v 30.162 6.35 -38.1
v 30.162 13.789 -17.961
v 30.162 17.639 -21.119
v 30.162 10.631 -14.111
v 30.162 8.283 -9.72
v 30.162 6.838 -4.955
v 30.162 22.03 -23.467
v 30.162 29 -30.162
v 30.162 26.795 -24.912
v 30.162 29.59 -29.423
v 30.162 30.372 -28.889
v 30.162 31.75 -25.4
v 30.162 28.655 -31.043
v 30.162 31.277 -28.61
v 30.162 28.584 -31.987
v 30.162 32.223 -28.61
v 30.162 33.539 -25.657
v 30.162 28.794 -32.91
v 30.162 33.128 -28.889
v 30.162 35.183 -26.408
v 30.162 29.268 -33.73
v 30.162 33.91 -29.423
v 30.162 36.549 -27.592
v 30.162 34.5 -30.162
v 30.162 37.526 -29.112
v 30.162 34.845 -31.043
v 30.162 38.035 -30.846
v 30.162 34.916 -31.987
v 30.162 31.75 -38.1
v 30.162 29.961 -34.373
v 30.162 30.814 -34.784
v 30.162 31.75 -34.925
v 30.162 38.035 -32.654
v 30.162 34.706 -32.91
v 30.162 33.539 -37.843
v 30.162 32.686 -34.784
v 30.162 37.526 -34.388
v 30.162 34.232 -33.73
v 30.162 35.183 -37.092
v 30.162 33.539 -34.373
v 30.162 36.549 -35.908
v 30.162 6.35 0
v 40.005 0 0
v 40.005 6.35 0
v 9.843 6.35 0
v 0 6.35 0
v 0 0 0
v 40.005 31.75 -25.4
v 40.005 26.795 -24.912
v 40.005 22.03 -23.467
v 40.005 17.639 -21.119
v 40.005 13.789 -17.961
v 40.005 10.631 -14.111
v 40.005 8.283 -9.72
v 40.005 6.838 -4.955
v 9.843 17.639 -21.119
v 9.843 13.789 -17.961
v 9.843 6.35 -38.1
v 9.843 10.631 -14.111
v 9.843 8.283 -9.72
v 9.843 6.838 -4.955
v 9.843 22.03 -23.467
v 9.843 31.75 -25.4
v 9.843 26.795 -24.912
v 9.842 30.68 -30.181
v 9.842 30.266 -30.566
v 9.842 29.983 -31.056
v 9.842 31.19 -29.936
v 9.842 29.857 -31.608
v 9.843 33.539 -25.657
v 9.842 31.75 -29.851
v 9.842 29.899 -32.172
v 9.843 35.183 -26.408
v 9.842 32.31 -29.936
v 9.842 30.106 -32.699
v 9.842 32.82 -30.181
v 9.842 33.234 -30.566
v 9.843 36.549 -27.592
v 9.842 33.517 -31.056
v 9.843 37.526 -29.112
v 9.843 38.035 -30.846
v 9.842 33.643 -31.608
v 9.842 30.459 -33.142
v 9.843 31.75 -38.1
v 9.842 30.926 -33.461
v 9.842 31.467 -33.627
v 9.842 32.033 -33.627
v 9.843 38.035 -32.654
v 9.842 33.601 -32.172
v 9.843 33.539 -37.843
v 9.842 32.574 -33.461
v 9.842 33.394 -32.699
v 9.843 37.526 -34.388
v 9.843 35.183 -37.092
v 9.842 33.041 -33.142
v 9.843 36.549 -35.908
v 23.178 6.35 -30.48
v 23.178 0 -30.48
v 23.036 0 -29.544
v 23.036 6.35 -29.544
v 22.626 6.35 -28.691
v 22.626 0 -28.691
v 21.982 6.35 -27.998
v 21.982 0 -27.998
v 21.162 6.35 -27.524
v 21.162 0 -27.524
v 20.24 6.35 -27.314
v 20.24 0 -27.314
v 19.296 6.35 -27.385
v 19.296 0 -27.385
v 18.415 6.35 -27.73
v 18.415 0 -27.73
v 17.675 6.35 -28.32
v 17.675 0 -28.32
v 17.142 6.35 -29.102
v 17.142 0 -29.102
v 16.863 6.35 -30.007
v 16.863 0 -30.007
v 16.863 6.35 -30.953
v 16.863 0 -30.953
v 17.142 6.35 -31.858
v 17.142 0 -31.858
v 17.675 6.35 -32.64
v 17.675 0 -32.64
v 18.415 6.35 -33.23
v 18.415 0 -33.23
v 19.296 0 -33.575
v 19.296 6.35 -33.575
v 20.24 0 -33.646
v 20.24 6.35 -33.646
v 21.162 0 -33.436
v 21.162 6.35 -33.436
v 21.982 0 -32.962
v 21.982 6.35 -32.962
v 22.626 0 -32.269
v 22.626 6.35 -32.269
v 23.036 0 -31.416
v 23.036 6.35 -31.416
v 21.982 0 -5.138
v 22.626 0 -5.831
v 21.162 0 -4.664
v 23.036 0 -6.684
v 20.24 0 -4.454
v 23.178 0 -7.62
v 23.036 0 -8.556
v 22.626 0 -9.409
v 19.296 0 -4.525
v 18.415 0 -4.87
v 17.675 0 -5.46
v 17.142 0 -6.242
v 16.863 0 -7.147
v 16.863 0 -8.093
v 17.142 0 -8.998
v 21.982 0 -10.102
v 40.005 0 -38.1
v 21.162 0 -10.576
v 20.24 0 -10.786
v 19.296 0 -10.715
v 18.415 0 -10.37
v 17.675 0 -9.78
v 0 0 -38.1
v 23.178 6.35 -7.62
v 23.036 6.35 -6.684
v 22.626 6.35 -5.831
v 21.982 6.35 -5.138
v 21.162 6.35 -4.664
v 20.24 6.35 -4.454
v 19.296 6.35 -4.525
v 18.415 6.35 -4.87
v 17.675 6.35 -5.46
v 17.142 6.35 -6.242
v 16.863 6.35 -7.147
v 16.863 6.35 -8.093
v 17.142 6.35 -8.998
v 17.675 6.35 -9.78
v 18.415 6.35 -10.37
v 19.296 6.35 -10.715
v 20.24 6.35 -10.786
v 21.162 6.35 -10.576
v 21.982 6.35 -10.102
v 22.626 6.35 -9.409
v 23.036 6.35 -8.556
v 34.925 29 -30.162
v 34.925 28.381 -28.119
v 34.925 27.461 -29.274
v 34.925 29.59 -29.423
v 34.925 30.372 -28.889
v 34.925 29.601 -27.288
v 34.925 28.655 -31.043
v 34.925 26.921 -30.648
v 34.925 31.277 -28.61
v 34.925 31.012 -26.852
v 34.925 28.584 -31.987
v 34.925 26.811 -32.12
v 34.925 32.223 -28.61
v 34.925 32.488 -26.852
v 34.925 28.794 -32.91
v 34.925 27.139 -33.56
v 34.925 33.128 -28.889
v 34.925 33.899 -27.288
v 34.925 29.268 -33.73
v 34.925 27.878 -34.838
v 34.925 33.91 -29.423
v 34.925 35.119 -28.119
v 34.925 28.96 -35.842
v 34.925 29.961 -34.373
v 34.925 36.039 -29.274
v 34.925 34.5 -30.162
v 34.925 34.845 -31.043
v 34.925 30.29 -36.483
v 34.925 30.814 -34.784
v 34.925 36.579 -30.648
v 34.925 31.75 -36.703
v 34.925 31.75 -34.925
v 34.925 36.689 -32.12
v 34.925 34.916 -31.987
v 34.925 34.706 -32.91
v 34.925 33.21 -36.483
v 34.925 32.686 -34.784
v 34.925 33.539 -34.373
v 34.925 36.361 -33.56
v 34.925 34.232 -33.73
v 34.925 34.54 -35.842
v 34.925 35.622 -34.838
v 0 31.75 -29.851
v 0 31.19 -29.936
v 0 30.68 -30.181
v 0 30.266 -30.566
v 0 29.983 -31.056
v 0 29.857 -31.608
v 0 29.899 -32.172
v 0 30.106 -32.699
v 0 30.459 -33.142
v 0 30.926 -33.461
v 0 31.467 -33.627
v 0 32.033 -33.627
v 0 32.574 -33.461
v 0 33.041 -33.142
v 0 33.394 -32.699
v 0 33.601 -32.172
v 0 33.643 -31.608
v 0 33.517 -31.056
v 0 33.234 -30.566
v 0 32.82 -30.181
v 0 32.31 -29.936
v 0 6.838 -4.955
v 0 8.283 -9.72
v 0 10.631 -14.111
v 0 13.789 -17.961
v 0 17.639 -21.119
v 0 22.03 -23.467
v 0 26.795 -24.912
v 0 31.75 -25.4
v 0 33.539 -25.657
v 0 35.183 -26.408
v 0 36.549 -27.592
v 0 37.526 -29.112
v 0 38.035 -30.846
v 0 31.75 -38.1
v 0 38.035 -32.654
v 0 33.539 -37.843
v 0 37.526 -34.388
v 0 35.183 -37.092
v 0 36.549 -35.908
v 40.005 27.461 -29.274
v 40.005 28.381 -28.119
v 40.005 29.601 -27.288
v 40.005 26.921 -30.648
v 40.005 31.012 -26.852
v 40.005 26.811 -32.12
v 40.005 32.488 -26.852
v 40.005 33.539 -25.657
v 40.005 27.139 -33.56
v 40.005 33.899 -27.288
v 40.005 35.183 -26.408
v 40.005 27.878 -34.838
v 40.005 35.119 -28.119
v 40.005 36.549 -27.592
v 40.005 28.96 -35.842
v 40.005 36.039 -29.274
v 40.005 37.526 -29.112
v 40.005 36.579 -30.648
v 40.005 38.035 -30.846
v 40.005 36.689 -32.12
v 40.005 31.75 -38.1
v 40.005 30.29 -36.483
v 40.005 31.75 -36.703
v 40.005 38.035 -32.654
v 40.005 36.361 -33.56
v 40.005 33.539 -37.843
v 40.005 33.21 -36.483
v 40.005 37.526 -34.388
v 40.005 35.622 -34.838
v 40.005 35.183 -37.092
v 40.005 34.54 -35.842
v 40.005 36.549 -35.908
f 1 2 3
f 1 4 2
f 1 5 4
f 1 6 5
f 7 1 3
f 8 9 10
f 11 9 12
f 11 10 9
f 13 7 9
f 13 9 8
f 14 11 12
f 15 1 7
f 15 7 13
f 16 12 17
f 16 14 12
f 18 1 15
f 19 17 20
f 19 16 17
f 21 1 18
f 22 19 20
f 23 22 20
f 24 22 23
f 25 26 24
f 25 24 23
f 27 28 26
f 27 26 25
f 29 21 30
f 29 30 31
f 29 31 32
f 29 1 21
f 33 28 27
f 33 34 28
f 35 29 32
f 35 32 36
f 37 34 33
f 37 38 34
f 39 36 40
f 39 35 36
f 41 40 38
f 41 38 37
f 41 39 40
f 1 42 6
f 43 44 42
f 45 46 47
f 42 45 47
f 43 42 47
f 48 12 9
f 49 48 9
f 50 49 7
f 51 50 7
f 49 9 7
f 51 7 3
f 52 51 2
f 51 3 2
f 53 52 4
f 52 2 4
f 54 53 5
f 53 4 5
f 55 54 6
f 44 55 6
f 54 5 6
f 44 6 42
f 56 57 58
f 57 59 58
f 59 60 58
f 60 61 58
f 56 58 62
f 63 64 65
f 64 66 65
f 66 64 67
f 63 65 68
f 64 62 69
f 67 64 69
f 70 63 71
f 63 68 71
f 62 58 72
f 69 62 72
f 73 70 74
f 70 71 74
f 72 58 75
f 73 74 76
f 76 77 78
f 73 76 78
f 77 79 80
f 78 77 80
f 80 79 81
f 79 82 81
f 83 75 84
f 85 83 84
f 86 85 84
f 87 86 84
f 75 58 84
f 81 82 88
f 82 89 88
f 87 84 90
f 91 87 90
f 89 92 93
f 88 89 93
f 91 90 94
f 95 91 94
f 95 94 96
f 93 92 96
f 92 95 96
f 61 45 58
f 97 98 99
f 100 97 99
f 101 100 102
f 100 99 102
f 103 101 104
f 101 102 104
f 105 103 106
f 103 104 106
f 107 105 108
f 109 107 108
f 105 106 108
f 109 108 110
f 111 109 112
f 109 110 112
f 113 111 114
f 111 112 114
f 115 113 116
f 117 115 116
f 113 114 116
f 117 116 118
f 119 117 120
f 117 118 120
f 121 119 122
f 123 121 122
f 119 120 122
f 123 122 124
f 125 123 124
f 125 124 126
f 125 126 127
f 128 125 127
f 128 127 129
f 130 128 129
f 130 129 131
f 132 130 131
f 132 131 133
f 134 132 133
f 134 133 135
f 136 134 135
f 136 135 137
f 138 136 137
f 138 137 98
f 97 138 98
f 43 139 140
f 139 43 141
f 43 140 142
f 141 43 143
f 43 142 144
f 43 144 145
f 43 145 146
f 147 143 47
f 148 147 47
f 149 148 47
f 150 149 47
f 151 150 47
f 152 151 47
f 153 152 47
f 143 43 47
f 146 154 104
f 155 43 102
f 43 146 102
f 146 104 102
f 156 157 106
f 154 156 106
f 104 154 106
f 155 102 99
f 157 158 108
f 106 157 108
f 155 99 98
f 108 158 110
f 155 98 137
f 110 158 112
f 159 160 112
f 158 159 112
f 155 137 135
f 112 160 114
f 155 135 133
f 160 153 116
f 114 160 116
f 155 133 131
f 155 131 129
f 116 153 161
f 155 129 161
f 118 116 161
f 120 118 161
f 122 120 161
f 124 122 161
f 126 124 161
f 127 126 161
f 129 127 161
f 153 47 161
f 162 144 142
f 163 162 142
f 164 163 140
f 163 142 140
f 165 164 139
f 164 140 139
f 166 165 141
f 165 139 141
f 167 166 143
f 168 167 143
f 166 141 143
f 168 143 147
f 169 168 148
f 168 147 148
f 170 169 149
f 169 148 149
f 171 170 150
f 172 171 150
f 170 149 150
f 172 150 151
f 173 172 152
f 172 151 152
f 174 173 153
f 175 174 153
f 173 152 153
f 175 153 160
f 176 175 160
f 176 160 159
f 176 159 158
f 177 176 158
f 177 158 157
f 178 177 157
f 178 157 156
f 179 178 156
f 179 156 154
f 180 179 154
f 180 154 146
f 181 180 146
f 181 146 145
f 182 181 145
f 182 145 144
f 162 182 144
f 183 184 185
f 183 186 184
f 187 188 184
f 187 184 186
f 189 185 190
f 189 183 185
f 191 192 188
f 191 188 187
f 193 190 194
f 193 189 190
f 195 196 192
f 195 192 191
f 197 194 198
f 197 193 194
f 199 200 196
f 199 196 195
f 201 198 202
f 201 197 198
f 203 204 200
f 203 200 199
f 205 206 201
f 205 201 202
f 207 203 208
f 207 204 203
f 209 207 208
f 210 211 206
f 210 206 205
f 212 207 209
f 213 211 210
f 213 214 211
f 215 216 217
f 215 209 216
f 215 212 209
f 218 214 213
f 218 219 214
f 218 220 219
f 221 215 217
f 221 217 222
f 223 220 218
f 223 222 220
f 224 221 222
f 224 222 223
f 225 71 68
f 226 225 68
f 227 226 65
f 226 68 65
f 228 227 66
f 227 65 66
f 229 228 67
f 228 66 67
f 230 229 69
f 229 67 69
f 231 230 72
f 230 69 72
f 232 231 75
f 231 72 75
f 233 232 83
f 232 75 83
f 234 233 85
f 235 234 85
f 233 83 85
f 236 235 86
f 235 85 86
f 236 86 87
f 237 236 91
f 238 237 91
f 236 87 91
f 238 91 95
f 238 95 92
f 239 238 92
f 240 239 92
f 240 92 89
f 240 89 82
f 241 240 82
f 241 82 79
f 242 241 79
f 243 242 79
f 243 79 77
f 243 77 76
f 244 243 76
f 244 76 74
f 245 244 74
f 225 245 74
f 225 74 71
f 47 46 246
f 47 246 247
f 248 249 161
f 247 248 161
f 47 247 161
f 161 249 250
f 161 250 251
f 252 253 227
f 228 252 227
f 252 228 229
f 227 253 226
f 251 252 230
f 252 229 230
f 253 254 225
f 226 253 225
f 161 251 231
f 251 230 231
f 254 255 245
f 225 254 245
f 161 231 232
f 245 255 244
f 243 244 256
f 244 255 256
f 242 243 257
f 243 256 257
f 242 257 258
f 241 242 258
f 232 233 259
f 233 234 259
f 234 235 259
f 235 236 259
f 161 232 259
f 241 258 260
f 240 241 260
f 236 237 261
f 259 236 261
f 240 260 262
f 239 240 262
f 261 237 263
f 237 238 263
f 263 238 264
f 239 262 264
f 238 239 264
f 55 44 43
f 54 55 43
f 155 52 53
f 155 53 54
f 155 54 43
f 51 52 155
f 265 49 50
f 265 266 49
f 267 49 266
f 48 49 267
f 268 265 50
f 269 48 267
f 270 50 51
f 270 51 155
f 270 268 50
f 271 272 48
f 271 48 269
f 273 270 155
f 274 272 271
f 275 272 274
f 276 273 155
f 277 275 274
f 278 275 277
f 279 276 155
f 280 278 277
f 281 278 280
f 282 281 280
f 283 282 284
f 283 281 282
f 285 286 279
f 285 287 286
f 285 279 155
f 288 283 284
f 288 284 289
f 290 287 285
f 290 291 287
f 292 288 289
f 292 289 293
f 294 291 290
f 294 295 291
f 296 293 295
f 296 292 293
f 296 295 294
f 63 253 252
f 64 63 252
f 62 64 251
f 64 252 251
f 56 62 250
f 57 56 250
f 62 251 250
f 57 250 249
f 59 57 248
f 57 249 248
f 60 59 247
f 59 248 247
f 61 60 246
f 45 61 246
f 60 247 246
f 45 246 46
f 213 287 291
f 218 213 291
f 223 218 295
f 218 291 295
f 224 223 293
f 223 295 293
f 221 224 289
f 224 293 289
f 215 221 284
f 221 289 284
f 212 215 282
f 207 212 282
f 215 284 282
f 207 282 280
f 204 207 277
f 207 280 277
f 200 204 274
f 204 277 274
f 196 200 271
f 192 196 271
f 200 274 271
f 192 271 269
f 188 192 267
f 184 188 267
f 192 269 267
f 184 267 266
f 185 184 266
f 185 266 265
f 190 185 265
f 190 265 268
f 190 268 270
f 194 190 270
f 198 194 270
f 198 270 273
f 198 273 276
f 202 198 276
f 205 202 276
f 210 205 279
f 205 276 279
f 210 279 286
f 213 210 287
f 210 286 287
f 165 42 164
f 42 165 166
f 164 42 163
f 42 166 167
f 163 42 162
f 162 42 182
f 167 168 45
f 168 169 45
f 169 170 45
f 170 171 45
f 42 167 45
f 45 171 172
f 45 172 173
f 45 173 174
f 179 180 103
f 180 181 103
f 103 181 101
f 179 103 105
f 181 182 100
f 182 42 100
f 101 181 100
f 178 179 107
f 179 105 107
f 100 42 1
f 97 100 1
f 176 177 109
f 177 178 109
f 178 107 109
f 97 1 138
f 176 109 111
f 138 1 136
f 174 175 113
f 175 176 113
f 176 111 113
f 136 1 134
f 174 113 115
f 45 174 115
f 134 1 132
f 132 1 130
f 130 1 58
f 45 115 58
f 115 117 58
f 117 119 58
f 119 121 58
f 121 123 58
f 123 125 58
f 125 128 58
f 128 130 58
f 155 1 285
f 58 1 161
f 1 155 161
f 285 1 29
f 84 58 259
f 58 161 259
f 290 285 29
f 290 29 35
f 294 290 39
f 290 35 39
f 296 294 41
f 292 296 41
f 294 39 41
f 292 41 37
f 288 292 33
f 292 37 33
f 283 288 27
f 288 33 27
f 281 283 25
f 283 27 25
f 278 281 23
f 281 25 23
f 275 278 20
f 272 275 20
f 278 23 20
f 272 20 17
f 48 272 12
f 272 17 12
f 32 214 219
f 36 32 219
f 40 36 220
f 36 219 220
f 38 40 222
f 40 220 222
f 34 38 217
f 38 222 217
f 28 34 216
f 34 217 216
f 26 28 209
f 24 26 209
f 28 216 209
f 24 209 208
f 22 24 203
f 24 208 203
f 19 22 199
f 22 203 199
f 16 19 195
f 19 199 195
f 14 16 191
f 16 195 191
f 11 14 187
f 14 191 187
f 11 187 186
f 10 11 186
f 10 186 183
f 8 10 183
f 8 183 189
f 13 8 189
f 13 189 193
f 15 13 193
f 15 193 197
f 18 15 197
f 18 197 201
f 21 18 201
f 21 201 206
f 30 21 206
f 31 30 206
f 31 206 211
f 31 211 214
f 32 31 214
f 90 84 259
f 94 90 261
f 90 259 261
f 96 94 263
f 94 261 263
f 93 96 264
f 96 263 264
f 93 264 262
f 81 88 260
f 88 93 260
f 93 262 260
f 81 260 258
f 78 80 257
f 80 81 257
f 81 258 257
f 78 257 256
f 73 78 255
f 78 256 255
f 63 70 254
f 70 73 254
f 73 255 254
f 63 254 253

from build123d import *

# Parameters (mm, degrees)
EXTRUDE3_DEPTH                 = 40.005
SKETCH6_W                      = 20.32
SKETCH6_H                      = 42.20483691
EXTRUDE_SLOT_DEPTH             = 39.1
SKETCH8_R                      = 3.175
EXTRUDE_SHOULDER_THROUGH_DEPTH = 9.8425
SKETCH9_R                      = 4.953
EXTRUDE_CNTR_BORE_DEPTH        = 5.08
F_10_24_TAPPED_HOLE1_D         = 3.7973
F_10_24_TAPPED_HOLE1_DEPTH     = 12.827
F_10_24_TAPPED_HOLE1_TIP       = 1.140824014
SKETCH13_R                     = 3.175
EXTRUDE7_DEPTH                 = 39.1


with BuildPart() as part:
    # Sketch5 → Extrude3 (new body)
    with BuildSketch(Plane(origin=(0, 0, 0), x_dir=(0, 0, -1), z_dir=(1, 0, 0))):
        with BuildLine():
            Line((0, 0), (38.1, 0))
            Line((38.1, 0), (38.1, 31.75))
            ThreePointArc((38.1, 31.75), (31.75, 38.1), (25.4, 31.75))
            ThreePointArc((25.4, 31.75), (17.960512242, 13.789487758), (0, 6.35))
            Line((0, 6.35), (0, 0))
        make_face()
    extrude(amount=EXTRUDE3_DEPTH)

    # Sketch6 → Extrude - Slot (cut, through all)
    with BuildSketch(Plane(origin=(0, 0, -38.1), x_dir=(-1, 0, 0), z_dir=(0, 0, -1))):
        with Locations((-20.0025, 27.452418455)):
            Rectangle(SKETCH6_W, SKETCH6_H)
    extrude(amount=-EXTRUDE_SLOT_DEPTH, mode=Mode.SUBTRACT)

    # Sketch8 → Extrude - shoulder through (cut)
    with BuildSketch(Plane(origin=(40.005, 0, 0), x_dir=(0, 0, -1), z_dir=(1, 0, 0))):
        with Locations((31.75, 31.75)):
            Circle(SKETCH8_R)
    extrude(amount=-EXTRUDE_SHOULDER_THROUGH_DEPTH, mode=Mode.SUBTRACT)

    # Sketch9 → Extrude - cntr bore (cut)
    with BuildSketch(Plane(origin=(40.005, 0, 0), x_dir=(0, 0, -1), z_dir=(1, 0, 0))):
        with Locations((31.75, 31.75)):
            Circle(SKETCH9_R)
    extrude(amount=-EXTRUDE_CNTR_BORE_DEPTH, mode=Mode.SUBTRACT)

    # #10-24 Tapped Hole1
    with Locations(Plane(origin=(0, 31.75, -31.75), x_dir=(0, 0, -1), z_dir=(-1, 0, 0))):
        with Locations((0, 0)):
            Hole(F_10_24_TAPPED_HOLE1_D / 2, depth=F_10_24_TAPPED_HOLE1_DEPTH)
            with Locations((0, 0, -(F_10_24_TAPPED_HOLE1_DEPTH + F_10_24_TAPPED_HOLE1_TIP / 2))):  # 118° drill point
                Cone(0, F_10_24_TAPPED_HOLE1_D / 2, F_10_24_TAPPED_HOLE1_TIP, mode=Mode.SUBTRACT)

    # Sketch13 → Extrude7 (cut, through all)
    with BuildSketch(Plane.XZ):
        with Locations((20.0025, -7.62)):
            Circle(SKETCH13_R)
        with Locations((20.0025, -30.48)):
            Circle(SKETCH13_R)
    extrude(amount=-EXTRUDE7_DEPTH, mode=Mode.SUBTRACT)


solid = part.part
